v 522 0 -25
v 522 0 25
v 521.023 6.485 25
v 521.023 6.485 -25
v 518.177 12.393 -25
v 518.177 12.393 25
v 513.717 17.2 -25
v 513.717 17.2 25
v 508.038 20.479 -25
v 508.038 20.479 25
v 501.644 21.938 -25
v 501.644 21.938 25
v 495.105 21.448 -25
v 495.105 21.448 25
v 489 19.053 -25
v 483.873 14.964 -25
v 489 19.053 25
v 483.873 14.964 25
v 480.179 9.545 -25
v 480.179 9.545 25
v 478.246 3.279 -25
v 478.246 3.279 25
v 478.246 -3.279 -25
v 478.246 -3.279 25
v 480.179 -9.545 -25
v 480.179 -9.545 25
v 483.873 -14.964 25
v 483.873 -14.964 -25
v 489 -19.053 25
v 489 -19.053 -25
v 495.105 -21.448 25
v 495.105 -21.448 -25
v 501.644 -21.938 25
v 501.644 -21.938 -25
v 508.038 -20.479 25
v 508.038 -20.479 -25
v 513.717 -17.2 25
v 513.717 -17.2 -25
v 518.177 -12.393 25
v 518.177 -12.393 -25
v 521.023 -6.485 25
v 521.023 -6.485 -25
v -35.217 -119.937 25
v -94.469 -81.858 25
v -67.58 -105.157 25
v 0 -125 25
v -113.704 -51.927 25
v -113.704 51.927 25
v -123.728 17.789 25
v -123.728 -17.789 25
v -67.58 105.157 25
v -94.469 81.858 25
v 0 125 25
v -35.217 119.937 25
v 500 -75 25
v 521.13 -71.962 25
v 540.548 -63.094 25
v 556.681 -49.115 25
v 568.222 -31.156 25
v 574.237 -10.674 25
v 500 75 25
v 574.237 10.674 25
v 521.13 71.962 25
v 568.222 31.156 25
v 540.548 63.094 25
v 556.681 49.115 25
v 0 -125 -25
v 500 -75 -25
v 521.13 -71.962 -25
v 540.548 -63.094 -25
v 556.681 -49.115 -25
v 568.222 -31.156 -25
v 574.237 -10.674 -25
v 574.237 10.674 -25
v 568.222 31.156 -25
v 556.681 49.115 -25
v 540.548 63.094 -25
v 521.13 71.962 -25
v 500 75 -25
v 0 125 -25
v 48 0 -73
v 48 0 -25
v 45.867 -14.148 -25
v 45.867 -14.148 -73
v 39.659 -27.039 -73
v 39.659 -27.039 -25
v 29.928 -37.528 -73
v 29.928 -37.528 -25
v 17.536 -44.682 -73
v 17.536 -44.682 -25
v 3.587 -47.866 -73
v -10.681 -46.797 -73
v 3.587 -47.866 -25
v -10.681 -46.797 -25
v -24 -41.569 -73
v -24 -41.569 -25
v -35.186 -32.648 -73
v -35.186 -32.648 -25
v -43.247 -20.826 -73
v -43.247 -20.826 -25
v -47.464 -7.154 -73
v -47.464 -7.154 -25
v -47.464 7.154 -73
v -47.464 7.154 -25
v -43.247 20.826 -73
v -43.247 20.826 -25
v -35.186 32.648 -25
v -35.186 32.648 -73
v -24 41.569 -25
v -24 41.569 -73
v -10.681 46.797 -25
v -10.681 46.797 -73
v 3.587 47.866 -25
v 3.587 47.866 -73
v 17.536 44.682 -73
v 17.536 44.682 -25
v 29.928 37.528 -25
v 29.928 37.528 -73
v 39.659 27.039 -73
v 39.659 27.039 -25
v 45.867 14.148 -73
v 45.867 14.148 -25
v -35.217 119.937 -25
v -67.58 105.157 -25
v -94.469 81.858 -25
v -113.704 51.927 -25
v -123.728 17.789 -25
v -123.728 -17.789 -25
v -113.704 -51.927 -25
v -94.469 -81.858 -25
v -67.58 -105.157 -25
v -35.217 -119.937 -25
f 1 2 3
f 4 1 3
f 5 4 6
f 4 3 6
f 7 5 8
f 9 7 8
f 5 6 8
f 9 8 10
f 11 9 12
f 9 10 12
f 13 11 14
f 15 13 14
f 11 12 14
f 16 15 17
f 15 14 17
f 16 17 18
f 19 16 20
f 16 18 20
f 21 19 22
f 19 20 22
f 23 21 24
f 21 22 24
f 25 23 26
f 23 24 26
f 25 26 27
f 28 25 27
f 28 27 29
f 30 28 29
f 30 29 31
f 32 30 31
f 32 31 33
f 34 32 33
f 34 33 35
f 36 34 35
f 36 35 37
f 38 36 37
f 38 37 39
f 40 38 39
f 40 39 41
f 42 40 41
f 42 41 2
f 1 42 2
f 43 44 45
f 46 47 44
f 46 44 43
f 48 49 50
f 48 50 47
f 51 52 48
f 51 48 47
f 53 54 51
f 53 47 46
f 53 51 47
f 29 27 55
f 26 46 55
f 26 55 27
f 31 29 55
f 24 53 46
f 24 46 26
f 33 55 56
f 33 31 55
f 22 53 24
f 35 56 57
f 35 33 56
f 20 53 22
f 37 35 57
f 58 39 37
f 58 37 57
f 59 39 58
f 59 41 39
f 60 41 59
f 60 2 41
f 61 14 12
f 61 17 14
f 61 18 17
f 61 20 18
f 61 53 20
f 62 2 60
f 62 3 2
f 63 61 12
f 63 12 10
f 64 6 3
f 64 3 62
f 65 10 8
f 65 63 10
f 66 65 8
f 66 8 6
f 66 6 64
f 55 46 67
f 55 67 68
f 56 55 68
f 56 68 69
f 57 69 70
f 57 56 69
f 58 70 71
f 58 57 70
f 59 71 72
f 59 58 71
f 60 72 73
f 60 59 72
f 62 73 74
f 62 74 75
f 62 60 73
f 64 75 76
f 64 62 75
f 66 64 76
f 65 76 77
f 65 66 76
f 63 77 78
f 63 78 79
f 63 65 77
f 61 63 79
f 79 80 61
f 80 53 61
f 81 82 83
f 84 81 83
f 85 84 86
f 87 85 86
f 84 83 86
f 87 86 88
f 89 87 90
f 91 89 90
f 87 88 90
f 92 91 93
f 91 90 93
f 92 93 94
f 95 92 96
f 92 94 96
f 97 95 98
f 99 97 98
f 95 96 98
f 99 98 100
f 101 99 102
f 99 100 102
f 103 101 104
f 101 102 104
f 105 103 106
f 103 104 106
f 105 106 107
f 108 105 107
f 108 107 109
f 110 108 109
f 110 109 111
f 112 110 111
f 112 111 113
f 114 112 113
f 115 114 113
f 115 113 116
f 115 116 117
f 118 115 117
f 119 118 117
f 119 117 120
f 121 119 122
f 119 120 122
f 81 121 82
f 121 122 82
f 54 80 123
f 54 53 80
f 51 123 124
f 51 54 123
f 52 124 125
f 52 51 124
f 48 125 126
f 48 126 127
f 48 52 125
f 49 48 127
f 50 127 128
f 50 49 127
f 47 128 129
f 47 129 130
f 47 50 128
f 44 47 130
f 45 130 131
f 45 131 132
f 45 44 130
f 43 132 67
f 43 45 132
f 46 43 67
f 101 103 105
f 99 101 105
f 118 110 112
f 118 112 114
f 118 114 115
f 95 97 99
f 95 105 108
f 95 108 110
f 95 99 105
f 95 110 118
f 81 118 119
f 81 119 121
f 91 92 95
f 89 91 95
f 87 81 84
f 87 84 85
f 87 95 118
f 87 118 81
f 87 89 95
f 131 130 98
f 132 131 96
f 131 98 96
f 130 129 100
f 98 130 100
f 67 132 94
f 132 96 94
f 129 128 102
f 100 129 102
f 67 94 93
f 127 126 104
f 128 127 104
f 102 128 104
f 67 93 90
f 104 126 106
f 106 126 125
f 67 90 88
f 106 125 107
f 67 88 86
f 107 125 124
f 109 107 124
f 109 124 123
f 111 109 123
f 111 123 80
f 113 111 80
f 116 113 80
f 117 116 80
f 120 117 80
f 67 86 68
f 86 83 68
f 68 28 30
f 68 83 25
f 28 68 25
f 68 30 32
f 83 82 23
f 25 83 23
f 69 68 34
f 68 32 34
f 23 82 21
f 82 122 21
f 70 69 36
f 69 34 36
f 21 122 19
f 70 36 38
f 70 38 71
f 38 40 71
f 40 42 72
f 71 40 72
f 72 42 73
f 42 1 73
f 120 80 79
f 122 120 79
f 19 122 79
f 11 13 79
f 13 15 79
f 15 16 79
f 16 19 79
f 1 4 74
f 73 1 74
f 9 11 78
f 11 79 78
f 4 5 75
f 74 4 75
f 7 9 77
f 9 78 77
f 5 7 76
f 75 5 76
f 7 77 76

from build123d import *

# Parameters (mm, degrees)
PAD_DEPTH    = 25
SKETCH001_R  = 48
PAD001_DEPTH = 48
SKETCH002_R  = 22
POCKET_DEPTH = 51


with BuildPart() as part:
    # Sketch → Pad (new body, symmetric)
    with BuildSketch(Plane.XY):
        with BuildLine():
            ThreePointArc((0, 125), (-125, 0), (0, -125))
            Line((0, -125), (500, -75))
            ThreePointArc((500, -75), (575, 0), (500, 75))
            Line((0, 125), (500, 75))
        make_face()
    extrude(amount=PAD_DEPTH, both=True)

    # Sketch001 (on Face5 of Pad) → Pad001 (join)
    with BuildSketch(Plane(origin=(0, 0, -25), x_dir=(1, 0, 0), z_dir=(0, 0, -1))):
        Circle(SKETCH001_R)
    extrude(amount=PAD001_DEPTH)

    # Sketch002 (on Face5 of Pad001) → Pocket (cut)
    with BuildSketch(Plane.XY.offset(25)):
        with Locations((500, 0)):
            Circle(SKETCH002_R)
    extrude(amount=-POCKET_DEPTH, mode=Mode.SUBTRACT)


solid = part.part
